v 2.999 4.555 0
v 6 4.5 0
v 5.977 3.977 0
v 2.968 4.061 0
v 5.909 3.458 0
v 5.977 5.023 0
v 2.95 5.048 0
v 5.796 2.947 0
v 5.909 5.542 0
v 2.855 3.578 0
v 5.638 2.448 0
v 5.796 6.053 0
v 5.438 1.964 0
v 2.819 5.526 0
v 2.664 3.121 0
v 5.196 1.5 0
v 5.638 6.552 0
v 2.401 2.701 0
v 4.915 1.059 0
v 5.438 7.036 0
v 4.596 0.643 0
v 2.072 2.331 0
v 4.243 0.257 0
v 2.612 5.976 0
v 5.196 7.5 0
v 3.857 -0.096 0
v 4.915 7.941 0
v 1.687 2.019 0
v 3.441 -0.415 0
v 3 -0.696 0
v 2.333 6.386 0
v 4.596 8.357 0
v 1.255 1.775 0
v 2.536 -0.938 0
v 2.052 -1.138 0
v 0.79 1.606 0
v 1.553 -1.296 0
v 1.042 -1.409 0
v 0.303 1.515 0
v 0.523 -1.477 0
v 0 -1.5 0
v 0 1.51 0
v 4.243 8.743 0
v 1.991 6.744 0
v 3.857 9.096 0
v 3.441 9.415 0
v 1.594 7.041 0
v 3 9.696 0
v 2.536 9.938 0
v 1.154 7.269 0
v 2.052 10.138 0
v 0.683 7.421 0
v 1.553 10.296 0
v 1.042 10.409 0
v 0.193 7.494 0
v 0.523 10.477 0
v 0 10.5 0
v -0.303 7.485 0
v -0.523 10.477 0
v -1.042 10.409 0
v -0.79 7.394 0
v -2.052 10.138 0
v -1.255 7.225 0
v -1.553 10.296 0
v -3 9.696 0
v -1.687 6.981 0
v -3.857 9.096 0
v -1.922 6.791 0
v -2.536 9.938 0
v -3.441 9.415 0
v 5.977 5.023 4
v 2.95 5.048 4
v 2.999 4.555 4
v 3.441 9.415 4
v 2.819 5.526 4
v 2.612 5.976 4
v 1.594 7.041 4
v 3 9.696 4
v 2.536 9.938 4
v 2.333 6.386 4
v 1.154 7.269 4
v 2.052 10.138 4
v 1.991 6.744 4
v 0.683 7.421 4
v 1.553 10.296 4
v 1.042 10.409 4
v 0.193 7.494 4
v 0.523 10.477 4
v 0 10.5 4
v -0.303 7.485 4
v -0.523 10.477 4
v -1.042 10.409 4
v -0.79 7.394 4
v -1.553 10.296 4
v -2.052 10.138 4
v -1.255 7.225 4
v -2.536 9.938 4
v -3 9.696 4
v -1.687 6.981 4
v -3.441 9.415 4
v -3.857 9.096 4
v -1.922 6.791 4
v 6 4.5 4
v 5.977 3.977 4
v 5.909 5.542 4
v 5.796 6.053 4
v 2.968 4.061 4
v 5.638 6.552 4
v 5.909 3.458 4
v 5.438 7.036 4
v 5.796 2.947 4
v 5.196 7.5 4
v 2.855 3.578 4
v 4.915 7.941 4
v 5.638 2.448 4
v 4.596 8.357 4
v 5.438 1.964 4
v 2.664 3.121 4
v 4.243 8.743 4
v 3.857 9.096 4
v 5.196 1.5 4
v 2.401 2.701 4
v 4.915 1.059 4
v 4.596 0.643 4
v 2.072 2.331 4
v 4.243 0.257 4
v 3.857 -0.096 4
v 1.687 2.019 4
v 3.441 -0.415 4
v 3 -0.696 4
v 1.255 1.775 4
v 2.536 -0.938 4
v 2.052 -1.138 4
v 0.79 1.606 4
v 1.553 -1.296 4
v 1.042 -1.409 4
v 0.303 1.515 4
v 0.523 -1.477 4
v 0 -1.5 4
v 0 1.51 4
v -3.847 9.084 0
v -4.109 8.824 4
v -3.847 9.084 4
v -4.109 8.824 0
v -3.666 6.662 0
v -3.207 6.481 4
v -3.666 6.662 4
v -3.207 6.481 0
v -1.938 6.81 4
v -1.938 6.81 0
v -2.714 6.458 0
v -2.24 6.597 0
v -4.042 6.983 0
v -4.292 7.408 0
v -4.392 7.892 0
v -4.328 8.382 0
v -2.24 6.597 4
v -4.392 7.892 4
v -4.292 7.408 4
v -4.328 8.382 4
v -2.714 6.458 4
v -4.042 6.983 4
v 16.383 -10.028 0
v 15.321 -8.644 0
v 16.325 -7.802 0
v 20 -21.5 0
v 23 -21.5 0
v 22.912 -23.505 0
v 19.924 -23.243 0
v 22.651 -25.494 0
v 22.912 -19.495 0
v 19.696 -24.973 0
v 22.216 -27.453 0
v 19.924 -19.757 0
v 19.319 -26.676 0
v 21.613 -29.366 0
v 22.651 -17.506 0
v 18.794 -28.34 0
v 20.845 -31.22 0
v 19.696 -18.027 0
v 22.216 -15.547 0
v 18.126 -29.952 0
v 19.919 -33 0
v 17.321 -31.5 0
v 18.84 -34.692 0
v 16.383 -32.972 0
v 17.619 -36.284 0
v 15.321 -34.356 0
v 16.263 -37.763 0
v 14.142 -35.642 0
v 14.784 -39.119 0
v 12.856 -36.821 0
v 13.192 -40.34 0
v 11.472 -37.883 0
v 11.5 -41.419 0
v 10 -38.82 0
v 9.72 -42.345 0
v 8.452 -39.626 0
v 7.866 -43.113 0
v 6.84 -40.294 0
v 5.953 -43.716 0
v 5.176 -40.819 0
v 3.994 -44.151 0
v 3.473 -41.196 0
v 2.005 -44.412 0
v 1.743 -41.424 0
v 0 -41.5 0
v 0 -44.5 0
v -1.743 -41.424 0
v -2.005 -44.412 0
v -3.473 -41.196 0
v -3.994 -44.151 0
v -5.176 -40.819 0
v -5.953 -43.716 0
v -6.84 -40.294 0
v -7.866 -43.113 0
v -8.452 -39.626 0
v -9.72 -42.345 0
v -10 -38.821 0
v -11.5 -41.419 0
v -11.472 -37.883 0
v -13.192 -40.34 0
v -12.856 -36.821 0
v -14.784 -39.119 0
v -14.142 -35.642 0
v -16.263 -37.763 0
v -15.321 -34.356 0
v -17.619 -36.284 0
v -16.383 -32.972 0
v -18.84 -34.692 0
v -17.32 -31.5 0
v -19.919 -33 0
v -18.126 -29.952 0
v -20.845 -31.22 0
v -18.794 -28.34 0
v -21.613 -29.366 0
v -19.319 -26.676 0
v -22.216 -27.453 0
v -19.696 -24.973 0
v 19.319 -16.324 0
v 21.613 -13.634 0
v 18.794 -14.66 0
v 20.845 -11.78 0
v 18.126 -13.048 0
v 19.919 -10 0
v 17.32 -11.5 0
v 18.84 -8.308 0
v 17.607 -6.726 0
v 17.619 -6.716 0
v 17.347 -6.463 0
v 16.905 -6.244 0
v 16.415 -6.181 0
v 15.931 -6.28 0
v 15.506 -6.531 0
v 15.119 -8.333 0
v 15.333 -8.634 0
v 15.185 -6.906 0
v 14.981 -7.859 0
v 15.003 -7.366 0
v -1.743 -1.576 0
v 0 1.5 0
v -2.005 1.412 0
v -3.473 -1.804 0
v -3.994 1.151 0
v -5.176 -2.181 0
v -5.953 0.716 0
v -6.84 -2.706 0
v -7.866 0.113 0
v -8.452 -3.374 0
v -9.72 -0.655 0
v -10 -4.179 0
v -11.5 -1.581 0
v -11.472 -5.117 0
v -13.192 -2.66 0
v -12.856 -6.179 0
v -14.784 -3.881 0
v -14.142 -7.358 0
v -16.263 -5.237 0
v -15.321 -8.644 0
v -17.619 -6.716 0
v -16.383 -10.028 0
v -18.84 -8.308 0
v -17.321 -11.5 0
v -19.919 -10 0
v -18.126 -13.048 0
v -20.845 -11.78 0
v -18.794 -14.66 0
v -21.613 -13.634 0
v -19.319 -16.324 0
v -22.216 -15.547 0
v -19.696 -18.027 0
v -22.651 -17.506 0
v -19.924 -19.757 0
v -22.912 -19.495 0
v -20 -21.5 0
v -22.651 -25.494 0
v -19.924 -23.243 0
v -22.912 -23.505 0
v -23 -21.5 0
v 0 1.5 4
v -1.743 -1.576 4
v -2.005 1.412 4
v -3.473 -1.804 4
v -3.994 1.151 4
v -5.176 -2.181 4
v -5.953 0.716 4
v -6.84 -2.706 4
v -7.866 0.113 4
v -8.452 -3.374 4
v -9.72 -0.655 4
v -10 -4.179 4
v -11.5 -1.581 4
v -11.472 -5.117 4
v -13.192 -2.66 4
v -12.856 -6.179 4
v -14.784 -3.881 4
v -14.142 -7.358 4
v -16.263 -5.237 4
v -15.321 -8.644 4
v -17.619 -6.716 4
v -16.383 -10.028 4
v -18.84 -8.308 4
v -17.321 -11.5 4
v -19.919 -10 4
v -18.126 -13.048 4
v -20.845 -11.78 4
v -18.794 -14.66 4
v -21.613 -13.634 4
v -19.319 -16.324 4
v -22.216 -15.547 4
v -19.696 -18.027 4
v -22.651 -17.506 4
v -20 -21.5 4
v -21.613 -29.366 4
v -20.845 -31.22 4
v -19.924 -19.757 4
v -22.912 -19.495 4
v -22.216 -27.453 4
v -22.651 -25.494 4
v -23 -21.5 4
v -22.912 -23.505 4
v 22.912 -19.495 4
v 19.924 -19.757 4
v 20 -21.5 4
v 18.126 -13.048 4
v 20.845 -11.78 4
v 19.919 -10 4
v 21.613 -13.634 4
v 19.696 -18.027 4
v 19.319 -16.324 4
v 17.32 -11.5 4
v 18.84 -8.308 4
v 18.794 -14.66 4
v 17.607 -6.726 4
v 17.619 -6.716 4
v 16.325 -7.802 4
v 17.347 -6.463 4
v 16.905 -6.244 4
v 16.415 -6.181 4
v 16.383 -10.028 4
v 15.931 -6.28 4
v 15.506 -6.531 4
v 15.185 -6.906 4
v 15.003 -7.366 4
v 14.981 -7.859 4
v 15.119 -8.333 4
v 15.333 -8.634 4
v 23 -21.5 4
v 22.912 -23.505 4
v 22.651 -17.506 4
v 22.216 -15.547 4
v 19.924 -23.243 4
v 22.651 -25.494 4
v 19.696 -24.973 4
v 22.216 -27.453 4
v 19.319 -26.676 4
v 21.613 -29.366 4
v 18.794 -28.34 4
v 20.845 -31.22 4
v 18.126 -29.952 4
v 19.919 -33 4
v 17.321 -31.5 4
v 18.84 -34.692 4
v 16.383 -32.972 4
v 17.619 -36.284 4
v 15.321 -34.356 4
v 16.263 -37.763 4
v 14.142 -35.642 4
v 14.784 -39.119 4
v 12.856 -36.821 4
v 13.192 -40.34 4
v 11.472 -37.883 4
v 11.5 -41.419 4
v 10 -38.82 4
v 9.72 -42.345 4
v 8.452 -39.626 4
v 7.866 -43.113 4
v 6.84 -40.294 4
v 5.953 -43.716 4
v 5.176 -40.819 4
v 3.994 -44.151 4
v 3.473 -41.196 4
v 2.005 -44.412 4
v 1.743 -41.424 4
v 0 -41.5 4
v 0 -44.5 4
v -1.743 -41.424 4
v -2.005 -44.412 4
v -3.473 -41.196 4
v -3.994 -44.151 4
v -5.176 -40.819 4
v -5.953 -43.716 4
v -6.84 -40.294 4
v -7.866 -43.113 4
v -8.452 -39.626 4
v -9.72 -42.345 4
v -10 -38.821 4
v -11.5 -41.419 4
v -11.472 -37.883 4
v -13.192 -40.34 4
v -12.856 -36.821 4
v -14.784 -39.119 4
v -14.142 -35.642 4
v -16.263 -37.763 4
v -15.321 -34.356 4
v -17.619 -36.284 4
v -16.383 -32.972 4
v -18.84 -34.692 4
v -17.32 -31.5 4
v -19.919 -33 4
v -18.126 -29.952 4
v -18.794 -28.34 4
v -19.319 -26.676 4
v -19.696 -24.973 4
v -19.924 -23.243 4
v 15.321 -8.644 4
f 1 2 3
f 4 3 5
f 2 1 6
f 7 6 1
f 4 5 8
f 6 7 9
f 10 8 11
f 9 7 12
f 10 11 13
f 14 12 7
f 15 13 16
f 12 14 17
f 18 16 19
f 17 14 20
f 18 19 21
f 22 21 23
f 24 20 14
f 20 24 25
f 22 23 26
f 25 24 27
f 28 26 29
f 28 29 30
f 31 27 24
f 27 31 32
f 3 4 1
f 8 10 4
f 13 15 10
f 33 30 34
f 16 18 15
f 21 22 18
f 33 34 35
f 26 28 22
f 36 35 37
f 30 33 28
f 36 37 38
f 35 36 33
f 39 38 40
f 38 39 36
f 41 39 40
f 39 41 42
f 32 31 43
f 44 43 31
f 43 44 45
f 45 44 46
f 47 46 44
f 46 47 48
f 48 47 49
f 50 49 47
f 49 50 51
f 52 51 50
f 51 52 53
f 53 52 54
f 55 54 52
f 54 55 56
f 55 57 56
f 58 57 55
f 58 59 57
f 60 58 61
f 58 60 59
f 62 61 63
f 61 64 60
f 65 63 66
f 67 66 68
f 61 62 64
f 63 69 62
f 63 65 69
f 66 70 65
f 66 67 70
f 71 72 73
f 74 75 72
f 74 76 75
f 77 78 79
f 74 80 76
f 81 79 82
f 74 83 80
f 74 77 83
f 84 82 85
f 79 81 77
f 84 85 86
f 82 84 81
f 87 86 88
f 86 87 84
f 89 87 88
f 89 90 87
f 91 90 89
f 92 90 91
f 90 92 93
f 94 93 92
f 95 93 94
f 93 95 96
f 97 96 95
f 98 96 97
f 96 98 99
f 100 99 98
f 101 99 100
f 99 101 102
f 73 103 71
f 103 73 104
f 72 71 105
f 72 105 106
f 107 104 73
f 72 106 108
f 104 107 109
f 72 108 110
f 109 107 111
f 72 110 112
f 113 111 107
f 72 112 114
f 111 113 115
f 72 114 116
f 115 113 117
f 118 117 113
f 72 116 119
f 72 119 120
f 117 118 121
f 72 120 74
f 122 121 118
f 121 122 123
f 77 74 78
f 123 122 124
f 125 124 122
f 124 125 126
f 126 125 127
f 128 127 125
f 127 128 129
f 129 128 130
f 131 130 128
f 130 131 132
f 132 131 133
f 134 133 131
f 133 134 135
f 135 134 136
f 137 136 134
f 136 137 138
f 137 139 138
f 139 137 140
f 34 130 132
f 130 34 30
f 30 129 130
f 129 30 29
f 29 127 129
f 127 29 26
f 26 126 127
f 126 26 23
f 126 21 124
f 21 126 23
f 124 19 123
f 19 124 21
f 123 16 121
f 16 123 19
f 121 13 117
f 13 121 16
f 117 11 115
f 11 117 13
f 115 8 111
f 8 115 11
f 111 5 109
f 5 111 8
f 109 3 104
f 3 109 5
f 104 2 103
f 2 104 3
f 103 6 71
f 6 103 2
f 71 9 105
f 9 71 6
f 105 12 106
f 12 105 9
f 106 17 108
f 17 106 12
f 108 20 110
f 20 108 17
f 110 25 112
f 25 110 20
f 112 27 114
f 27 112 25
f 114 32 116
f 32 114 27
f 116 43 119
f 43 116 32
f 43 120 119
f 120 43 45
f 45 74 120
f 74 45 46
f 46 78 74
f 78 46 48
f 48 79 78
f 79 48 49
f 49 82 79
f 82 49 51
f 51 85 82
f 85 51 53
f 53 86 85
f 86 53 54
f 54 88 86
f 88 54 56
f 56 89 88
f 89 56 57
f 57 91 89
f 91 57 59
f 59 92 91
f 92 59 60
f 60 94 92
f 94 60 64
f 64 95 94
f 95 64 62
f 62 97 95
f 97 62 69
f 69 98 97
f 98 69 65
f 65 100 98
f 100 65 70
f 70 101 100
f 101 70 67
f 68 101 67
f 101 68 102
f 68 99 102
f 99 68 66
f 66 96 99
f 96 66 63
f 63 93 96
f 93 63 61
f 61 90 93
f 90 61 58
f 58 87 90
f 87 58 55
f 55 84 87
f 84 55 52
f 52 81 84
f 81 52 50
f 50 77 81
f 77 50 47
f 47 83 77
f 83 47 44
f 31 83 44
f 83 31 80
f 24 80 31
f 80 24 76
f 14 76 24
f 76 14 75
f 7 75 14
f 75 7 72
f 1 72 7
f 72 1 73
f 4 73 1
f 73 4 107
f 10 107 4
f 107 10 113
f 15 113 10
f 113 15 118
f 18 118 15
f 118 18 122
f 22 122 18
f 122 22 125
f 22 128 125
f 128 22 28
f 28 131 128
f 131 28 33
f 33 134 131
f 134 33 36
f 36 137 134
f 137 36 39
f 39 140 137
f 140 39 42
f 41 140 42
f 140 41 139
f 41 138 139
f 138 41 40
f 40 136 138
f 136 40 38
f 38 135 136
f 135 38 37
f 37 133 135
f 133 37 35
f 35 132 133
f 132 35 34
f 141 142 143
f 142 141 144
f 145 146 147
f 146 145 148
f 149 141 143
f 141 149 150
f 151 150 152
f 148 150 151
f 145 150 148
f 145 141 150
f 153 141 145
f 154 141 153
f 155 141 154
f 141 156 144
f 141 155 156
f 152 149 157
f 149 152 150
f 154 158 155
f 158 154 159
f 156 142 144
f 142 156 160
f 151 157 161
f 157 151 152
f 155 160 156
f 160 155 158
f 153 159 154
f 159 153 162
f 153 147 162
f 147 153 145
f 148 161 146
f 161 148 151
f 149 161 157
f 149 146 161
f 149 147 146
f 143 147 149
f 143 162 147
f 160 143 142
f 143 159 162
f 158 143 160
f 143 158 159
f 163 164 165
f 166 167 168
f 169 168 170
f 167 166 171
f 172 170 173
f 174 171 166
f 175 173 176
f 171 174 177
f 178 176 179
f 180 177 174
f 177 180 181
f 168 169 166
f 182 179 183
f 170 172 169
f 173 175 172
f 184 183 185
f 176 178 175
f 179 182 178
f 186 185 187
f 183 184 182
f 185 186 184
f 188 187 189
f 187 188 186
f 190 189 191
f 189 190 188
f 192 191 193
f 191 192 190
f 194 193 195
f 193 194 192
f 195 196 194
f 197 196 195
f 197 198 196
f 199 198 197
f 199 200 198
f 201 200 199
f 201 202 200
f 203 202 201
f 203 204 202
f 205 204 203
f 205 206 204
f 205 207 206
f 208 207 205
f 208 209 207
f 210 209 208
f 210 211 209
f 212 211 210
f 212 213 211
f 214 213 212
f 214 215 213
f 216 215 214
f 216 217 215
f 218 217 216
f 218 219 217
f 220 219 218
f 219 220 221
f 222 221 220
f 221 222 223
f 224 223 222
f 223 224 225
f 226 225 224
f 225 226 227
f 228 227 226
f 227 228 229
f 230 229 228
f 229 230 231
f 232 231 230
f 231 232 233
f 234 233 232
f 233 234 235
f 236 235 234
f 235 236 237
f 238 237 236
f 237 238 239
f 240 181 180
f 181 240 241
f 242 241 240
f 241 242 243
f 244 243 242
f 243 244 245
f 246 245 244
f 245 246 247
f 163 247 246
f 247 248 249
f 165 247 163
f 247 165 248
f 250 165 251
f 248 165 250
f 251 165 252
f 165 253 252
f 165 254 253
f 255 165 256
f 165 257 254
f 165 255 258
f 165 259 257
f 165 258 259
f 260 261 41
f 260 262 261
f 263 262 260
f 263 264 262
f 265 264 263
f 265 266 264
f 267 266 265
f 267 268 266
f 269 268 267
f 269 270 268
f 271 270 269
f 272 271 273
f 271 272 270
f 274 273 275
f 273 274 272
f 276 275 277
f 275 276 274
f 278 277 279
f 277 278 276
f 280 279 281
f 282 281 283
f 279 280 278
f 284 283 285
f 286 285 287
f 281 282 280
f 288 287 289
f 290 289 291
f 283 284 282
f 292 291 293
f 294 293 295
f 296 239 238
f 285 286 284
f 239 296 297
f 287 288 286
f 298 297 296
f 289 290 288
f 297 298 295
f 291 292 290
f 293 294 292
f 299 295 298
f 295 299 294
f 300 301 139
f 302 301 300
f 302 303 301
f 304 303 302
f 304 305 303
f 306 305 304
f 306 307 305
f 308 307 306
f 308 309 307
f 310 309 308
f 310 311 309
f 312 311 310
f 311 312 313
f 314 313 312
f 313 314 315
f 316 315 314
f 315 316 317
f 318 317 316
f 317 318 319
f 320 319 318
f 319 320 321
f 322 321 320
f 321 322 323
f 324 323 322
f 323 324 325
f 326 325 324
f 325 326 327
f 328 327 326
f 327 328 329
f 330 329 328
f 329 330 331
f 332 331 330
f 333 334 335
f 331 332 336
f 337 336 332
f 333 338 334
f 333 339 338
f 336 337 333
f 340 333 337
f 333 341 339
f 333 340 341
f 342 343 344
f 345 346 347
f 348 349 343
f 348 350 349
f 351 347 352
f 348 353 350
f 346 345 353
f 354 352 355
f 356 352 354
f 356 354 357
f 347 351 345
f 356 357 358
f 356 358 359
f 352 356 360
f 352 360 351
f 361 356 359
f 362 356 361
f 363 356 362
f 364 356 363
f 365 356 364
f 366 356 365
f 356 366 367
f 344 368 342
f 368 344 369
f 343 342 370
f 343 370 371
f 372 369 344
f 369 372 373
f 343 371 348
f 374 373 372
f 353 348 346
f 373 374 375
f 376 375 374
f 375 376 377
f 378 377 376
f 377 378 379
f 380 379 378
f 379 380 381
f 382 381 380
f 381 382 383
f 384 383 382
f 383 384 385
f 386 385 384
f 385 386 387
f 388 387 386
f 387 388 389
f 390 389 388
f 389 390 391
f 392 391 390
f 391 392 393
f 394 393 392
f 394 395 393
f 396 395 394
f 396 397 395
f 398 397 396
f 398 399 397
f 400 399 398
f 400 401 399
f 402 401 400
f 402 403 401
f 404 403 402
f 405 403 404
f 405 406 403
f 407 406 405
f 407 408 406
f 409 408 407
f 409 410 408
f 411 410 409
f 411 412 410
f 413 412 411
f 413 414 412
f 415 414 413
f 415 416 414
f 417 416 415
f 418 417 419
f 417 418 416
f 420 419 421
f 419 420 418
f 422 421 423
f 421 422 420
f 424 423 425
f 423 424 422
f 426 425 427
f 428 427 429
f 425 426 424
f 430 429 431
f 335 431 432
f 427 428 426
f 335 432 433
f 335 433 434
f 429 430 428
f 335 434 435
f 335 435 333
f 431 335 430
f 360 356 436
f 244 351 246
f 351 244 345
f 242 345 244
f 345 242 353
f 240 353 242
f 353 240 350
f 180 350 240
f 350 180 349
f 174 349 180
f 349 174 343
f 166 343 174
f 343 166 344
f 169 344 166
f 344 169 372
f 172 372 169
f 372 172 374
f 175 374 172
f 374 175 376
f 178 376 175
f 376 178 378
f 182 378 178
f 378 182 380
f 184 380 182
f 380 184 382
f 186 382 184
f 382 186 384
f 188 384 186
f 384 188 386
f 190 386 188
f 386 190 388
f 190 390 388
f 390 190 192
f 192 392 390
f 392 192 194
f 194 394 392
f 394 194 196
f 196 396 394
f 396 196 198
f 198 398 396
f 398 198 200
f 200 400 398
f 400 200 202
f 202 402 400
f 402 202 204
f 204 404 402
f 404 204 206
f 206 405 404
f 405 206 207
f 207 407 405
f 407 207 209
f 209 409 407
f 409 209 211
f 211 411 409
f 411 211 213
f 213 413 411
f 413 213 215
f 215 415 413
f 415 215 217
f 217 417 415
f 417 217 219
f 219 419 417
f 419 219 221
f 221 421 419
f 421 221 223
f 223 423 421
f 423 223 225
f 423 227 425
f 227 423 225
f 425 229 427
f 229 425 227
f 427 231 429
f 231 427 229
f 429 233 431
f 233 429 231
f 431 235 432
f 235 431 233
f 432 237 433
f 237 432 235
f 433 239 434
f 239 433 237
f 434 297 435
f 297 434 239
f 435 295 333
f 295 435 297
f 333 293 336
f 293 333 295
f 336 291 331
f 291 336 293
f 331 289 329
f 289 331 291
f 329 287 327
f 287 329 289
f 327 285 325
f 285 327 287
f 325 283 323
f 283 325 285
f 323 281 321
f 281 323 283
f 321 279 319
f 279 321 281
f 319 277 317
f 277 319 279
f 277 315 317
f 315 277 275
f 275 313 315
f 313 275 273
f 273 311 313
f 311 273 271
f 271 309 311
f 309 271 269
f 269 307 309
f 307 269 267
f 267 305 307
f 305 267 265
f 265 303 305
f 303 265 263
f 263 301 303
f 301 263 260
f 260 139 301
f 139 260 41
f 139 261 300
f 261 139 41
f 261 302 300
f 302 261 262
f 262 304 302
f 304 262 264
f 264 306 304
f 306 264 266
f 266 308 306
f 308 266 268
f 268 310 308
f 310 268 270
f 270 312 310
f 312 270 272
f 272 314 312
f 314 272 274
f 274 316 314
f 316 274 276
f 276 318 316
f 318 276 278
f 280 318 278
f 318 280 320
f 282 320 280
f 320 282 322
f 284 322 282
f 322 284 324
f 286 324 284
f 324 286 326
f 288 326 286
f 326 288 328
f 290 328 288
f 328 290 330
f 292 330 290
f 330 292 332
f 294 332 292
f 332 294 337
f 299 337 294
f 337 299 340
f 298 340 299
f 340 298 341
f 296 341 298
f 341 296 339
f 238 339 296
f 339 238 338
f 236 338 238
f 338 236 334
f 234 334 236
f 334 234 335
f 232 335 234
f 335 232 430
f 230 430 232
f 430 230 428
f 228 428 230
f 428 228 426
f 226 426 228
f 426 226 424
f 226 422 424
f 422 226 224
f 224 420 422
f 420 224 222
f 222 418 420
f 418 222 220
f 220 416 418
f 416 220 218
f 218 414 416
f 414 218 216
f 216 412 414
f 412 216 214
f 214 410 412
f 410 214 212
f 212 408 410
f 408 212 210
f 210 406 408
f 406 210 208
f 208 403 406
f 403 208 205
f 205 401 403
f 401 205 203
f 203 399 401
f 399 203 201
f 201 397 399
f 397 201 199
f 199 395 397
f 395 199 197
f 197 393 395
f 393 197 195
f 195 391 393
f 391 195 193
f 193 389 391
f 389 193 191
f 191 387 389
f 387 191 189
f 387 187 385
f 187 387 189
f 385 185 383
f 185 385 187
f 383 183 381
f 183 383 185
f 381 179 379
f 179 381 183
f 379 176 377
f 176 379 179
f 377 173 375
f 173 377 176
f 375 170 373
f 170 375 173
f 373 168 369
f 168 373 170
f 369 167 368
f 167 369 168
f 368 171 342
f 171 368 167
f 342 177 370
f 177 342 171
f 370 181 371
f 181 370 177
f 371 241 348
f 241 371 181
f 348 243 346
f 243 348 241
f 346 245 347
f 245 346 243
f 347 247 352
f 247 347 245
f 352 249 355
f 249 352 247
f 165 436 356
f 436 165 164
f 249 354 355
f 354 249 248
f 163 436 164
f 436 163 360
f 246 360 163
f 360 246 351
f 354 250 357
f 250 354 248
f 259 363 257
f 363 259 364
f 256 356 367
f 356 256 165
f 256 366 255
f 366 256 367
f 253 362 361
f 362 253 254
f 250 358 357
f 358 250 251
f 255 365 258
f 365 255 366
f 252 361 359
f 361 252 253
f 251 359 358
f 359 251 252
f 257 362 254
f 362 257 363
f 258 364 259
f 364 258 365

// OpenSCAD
Guide_Tickness = 4; // [1:10]
Guide_Width = 3; // [2:6]

// Radius of the thing you fix the guide to
Small_Radius = 3; // [1:10]

// How much room do you give your plant?
Large_Radius = 20; // [10:50]


module arc(radius, thick, angle){
	intersection(){
		union(){
			rights = floor(angle/90);
			remain = angle-rights*90;
			if(angle > 90){
				for(i = [0:rights-1]){
					rotate(i*90-(rights-1)*90/2){
						polygon([[0, 0], [radius+thick, (radius+thick)*tan(90/2)], [radius+thick, -(radius+thick)*tan(90/2)]]);
					}
				}
				rotate(-(rights)*90/2)
					polygon([[0, 0], [radius+thick, 0], [radius+thick, -(radius+thick)*tan(remain/2)]]);
				rotate((rights)*90/2)
					polygon([[0, 0], [radius+thick, (radius+thick)*tan(remain/2)], [radius+thick, 0]]);
			}else{
				polygon([[0, 0], [radius+thick, (radius+thick)*tan(angle/2)], [radius+thick, -(radius+thick)*tan(angle/2)]]);
			}
		}
		difference(){
			circle(radius+thick);
			circle(radius);
		}
	}
}


// Set number of faces
$fs=0.5;
$fa=5;

// Draw Small Arc
translate([0,Small_Radius+Guide_Width/2,0])
rotate([0,0,20])   
linear_extrude(height=Guide_Tickness)
    arc(Small_Radius, Guide_Width, 220);
;

// Draw Small Arc Fillet
translate([0,Small_Radius+Guide_Width/2,0])
rotate([0,0,220])    
translate([0,-Small_Radius-Guide_Width/2,0]) 
linear_extrude(height=Guide_Tickness)
        arc(0, Guide_Width/2, 180);
;

// Draw Large Arc
translate([0,-Large_Radius-Guide_Width/2,0])    
rotate([0,0,245])
linear_extrude(height=Guide_Tickness)
    arc(Large_Radius, Guide_Width, 310);
;

// Draw Large Arc Fillet
translate([0,-Large_Radius-Guide_Width/2,0])    
rotate([0,0,130])    
translate([0,-Large_Radius-Guide_Width/2,0]) 
linear_extrude(height=Guide_Tickness)
    arc(0, Guide_Width/2, 180);
;
